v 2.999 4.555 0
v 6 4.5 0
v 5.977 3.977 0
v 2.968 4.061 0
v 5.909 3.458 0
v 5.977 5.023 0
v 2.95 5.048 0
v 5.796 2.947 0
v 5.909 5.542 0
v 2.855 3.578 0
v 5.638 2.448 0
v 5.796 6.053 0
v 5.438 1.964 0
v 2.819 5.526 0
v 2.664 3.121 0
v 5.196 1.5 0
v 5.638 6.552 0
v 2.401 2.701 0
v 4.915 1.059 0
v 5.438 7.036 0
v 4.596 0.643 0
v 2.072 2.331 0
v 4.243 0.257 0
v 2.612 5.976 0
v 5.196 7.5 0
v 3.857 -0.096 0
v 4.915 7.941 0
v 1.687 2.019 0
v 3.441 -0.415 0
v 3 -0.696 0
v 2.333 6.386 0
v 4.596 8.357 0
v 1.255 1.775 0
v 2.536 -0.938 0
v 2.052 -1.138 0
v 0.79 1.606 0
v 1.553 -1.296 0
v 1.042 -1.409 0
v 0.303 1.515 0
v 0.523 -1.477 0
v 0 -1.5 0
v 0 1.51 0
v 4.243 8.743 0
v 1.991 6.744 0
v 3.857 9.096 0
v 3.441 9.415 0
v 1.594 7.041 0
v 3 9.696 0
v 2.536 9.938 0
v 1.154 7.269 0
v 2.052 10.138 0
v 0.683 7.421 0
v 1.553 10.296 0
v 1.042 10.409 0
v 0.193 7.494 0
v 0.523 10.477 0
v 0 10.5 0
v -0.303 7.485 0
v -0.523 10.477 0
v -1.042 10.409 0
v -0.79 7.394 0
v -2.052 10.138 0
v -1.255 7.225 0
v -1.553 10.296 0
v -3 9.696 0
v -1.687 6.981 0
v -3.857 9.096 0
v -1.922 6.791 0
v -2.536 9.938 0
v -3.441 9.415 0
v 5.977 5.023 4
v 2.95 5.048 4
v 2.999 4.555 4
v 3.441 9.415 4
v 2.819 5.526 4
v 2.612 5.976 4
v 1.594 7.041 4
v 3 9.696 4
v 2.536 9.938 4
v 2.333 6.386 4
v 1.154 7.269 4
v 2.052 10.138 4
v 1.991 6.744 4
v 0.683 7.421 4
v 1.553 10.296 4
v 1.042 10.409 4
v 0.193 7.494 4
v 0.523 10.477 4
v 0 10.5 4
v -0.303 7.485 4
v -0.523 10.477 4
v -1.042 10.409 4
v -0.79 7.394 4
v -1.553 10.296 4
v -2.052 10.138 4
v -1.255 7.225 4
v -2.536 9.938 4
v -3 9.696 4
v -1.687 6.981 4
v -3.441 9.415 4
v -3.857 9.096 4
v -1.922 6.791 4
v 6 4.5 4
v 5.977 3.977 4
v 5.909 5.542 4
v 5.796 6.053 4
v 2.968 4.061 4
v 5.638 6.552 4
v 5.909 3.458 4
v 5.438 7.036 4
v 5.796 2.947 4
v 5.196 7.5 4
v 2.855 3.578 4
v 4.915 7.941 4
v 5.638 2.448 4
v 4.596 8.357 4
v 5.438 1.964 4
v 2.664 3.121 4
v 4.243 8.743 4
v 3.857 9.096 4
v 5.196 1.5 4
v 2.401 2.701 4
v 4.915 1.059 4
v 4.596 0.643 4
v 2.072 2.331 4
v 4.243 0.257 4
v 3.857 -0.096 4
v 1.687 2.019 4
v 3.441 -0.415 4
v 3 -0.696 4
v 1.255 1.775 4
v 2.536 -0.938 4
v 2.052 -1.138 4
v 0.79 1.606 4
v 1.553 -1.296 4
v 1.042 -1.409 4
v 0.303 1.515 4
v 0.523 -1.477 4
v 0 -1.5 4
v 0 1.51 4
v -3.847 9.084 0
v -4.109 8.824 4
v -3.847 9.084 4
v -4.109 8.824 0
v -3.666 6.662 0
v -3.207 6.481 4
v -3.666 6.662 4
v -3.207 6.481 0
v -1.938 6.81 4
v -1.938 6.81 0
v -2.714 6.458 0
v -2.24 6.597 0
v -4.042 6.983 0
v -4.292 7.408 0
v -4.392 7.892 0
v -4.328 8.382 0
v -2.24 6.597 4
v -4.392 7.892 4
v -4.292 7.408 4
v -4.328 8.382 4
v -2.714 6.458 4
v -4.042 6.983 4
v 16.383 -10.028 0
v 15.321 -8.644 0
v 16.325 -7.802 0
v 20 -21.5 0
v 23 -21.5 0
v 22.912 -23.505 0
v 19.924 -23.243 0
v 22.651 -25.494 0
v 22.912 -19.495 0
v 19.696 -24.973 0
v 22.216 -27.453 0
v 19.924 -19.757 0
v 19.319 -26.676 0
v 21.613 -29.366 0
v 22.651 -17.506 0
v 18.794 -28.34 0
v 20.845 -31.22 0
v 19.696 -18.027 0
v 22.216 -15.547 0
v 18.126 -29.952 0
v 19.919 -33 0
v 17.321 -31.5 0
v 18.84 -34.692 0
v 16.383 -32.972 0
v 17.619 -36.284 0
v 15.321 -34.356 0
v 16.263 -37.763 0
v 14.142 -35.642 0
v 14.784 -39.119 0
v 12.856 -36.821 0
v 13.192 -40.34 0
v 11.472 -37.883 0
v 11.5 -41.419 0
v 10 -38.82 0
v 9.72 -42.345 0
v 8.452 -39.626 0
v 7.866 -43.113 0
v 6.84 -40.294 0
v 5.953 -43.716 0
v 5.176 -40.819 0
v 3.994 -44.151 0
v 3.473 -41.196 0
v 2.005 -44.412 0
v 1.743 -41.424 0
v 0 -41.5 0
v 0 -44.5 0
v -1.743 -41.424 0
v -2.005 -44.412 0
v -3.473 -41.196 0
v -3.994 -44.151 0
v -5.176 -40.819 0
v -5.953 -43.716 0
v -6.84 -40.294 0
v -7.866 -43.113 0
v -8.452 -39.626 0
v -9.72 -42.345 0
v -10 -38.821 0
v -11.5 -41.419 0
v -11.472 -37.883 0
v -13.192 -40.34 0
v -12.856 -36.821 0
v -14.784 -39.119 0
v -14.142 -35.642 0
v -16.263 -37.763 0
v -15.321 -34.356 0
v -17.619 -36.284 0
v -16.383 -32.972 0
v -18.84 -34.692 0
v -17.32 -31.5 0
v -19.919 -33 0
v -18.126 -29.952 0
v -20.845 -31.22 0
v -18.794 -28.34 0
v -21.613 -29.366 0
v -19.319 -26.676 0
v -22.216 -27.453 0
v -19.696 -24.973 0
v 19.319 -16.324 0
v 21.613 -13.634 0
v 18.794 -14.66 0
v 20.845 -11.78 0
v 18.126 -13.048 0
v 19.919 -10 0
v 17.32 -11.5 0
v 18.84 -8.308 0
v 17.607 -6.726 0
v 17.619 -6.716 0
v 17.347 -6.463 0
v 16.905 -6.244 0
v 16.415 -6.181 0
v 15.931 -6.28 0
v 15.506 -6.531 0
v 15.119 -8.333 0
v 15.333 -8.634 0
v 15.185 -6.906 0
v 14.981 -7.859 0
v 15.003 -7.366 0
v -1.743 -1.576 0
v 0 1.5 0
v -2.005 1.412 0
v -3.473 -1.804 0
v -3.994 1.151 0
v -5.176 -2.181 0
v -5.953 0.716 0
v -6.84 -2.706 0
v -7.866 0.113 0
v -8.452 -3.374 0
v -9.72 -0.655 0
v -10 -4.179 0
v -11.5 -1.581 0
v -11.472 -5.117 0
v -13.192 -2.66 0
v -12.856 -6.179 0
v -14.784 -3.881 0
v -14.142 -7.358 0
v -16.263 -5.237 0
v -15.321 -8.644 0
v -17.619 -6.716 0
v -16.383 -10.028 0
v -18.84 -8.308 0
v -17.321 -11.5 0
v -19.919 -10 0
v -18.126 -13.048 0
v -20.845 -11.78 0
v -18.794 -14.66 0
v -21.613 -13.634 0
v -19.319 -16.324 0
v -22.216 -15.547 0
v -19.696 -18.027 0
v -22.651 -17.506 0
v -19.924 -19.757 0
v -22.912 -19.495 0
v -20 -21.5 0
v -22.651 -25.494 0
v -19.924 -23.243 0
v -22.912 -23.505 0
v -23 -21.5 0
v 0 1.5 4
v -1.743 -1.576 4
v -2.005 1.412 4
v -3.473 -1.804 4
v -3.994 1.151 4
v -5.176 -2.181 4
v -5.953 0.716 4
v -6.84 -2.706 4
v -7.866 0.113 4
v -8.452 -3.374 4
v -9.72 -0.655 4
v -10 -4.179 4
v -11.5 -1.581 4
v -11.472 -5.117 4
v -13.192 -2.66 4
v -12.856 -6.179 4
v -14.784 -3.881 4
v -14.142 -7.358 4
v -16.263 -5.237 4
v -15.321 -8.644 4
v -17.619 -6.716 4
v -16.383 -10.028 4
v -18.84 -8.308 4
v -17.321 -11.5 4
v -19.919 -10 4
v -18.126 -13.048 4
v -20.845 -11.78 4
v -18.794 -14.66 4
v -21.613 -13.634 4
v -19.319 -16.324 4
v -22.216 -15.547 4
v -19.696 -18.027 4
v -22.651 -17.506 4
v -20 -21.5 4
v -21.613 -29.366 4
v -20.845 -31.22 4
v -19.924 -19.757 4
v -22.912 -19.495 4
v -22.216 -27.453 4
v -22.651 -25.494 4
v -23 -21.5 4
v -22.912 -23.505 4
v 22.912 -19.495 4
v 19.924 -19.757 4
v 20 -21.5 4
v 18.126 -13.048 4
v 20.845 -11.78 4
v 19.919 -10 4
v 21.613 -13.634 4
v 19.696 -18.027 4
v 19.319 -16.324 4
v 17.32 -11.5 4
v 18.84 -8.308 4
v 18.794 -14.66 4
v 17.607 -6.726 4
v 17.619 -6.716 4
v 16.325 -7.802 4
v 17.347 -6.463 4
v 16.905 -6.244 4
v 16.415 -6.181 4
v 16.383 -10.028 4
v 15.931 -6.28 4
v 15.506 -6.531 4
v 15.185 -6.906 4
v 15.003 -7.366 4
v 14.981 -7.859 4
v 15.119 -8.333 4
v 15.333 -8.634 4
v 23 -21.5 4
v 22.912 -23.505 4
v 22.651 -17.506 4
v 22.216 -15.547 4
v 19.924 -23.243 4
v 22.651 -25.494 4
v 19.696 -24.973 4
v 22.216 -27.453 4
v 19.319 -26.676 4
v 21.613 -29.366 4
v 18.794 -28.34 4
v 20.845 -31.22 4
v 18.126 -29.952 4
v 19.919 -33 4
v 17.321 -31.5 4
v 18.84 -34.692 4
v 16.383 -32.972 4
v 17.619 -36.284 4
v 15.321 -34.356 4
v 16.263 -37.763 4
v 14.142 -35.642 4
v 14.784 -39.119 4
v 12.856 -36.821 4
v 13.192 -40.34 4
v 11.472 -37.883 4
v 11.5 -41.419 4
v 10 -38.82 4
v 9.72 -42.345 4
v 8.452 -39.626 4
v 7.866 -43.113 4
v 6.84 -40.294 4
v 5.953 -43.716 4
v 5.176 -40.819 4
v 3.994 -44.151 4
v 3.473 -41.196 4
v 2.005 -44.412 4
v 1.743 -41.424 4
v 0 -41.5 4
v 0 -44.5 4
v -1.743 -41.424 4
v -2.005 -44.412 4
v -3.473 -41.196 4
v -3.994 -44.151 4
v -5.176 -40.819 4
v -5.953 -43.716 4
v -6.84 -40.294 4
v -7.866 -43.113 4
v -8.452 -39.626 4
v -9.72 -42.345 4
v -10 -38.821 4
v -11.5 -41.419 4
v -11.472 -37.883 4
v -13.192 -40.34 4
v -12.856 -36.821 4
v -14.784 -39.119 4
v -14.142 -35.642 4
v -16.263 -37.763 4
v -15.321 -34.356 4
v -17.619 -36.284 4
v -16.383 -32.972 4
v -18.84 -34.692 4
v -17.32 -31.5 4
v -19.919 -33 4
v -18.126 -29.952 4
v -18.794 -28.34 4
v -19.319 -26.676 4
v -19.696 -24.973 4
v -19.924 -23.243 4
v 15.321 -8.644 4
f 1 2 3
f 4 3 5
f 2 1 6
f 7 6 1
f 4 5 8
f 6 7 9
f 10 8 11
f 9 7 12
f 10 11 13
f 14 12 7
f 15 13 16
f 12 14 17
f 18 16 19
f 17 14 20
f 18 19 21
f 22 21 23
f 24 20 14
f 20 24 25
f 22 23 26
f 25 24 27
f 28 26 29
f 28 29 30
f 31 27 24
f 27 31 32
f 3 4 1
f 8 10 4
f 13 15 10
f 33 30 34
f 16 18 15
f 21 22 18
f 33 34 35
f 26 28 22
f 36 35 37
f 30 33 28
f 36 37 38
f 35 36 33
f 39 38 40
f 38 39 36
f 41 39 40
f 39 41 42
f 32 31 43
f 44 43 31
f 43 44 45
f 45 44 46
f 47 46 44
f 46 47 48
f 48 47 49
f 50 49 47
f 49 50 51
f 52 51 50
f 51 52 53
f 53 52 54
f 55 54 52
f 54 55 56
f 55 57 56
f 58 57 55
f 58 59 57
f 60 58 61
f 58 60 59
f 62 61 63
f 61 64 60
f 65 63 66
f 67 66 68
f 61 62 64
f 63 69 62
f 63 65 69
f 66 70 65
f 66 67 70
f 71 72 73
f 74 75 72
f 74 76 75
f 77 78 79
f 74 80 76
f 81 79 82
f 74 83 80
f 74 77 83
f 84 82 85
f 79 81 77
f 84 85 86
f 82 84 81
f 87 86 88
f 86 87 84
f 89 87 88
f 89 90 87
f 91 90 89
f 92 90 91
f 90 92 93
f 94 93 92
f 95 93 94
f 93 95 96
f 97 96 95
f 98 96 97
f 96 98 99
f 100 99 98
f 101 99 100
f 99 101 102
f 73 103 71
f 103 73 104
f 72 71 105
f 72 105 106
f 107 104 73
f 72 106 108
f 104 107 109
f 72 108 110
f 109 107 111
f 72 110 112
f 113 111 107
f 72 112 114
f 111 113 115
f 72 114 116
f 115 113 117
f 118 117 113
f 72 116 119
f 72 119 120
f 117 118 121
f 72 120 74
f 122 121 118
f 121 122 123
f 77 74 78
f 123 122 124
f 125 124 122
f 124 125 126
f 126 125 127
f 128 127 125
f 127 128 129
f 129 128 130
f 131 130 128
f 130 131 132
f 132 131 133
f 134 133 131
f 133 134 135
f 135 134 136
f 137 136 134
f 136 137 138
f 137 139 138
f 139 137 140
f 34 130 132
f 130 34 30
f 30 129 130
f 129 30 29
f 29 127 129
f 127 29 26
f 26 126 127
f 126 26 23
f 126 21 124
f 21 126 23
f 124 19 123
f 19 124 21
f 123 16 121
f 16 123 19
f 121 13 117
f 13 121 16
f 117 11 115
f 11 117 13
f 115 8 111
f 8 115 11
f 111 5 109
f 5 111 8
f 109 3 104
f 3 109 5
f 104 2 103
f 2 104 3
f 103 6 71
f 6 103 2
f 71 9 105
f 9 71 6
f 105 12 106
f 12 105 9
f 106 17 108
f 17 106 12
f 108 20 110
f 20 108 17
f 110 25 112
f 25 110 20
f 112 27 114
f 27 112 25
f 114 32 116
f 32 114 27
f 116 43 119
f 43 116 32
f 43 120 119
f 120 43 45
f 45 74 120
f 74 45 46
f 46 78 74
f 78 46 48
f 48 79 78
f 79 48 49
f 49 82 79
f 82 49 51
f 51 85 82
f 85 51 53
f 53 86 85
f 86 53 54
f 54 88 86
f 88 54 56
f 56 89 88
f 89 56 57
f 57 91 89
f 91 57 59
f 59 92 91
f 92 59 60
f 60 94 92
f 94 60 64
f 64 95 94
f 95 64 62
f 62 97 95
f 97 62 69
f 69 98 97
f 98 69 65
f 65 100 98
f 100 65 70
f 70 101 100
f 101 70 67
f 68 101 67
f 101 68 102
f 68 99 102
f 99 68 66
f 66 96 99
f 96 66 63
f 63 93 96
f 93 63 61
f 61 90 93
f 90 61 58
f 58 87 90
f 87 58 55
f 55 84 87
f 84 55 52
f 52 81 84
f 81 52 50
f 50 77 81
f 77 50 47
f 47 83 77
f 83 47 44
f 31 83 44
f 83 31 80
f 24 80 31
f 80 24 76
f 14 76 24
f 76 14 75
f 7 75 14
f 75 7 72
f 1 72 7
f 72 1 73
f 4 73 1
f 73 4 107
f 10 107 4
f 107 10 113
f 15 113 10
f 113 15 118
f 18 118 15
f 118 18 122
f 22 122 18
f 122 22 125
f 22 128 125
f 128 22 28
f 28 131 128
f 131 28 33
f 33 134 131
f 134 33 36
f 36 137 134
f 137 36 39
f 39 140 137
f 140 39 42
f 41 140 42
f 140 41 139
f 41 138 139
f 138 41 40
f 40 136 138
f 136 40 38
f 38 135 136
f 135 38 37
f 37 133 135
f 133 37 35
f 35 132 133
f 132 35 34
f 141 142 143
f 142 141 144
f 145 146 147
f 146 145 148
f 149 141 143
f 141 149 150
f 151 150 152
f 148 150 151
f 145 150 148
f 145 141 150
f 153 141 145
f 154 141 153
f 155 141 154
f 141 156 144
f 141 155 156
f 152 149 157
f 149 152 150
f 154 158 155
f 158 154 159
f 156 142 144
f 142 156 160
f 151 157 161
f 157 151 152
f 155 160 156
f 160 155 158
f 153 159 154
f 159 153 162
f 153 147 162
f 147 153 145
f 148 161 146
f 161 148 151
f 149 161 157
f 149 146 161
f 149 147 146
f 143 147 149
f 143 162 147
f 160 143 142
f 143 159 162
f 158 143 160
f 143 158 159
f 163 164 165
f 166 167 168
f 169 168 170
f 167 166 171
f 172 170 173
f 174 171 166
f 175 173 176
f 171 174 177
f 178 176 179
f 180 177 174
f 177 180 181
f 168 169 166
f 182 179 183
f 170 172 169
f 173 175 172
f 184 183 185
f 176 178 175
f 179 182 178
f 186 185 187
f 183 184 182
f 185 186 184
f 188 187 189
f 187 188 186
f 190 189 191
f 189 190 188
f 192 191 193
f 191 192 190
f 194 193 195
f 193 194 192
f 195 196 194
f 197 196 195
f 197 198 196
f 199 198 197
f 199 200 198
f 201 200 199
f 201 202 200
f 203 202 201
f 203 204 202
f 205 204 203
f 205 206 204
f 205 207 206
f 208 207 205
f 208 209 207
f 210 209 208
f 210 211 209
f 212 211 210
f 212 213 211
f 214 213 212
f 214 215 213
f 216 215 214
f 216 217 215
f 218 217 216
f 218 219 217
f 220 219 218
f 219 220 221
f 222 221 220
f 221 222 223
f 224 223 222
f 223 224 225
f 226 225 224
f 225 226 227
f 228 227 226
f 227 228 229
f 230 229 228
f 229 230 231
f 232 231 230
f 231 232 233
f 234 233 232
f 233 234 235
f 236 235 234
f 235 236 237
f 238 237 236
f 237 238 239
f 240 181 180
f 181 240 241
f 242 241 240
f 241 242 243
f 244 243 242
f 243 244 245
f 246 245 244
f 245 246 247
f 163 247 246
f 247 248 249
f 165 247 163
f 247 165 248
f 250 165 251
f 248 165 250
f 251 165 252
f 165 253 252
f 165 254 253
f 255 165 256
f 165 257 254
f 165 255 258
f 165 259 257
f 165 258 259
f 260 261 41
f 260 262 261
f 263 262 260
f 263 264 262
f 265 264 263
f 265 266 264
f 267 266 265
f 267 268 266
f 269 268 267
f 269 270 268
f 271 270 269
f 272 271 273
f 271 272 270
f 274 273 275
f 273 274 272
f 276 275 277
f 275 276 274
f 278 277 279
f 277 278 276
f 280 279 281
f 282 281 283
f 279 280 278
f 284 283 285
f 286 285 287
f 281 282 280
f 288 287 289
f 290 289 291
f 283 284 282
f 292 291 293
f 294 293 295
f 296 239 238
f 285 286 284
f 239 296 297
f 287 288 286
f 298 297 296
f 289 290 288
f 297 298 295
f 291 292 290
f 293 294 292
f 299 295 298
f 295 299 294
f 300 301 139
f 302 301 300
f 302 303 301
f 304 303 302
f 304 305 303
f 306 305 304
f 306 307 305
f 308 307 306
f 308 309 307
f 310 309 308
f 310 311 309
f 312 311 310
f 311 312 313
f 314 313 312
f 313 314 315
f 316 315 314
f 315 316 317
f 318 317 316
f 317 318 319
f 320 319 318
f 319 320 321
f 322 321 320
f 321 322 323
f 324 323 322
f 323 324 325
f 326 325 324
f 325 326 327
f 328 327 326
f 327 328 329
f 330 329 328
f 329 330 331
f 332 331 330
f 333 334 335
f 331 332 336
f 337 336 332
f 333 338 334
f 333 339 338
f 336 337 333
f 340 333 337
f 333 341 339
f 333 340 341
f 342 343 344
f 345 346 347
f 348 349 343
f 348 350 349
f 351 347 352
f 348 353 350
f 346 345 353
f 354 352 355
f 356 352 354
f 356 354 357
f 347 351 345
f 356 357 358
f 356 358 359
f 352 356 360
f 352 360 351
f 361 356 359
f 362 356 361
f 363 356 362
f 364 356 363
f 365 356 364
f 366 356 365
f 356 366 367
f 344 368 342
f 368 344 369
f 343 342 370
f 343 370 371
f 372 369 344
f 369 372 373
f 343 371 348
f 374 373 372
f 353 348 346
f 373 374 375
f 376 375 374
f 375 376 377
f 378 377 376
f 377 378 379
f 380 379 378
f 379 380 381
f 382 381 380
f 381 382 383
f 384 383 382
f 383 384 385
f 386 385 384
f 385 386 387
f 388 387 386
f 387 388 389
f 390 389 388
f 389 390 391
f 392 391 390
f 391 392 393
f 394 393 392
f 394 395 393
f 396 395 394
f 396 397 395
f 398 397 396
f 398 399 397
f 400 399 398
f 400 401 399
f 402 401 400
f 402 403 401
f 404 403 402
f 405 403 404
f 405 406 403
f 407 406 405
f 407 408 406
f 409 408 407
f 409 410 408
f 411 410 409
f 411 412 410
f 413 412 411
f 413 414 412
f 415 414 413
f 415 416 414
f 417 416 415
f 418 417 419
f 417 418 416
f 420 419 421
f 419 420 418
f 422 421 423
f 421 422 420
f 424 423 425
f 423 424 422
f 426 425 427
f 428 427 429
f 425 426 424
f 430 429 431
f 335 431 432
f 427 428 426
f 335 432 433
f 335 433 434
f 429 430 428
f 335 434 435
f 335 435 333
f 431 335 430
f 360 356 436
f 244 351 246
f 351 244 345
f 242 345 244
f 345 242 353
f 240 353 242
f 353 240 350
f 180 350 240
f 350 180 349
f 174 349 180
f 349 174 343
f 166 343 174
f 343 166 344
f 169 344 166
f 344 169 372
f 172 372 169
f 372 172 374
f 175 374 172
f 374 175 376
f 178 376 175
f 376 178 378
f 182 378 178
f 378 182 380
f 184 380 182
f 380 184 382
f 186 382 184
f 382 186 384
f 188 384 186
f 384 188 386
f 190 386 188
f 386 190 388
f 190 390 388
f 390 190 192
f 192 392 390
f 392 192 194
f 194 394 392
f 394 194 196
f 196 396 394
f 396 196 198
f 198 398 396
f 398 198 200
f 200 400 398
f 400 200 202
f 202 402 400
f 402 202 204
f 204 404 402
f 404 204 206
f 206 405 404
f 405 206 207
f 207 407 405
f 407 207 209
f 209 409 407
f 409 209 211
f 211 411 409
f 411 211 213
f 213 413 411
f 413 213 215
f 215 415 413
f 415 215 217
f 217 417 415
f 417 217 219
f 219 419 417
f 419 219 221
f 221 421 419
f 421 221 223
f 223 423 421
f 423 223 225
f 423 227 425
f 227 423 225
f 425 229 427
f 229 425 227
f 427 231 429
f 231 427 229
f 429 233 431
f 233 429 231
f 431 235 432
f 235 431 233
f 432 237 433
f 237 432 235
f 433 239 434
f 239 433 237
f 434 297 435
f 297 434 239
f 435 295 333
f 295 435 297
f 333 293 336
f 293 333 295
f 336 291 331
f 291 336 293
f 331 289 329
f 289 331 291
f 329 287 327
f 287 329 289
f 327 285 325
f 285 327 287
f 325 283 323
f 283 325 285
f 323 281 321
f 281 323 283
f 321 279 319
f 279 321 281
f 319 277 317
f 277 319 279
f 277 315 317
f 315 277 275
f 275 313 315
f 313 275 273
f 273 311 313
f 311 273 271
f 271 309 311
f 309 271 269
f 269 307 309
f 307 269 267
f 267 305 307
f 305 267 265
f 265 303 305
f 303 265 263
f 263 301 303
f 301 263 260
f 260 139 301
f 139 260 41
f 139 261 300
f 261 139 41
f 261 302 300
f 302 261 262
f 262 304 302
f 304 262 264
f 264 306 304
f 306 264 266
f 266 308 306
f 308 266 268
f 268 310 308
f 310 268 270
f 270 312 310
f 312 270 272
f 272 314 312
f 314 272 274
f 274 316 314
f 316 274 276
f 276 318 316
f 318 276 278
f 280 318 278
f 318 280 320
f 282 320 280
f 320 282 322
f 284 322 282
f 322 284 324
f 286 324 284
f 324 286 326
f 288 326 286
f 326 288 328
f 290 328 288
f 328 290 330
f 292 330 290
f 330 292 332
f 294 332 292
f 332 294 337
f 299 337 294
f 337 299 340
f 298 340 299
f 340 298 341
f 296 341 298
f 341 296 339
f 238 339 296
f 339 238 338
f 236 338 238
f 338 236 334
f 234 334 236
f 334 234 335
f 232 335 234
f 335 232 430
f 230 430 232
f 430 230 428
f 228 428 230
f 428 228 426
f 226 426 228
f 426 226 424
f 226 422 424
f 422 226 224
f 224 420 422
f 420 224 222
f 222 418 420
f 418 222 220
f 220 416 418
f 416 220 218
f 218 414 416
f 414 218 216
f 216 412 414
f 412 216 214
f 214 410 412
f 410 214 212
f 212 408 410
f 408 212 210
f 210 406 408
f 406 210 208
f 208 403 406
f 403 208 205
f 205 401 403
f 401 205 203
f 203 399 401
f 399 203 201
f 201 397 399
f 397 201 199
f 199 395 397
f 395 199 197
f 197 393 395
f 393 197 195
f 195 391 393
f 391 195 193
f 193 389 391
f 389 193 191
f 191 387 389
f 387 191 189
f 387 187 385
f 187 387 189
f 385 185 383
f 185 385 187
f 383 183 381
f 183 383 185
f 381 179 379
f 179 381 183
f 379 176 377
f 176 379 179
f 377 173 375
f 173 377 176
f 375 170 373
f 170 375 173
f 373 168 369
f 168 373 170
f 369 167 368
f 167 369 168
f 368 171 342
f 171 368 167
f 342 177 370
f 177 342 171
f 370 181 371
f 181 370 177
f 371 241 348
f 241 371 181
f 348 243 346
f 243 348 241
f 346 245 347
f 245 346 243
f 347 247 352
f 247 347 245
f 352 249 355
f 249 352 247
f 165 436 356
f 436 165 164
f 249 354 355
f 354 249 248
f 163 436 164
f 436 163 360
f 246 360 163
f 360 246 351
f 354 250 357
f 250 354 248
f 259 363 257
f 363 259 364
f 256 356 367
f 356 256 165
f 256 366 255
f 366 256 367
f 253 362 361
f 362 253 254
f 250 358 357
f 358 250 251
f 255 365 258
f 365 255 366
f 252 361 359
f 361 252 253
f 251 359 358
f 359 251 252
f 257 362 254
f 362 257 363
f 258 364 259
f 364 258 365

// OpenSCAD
Guide_Tickness = 4; // [1:10]
Guide_Width = 3; // [2:6]

// Radius of the thing you fix the guide to
Small_Radius = 3; // [1:10]

// How much room do you give your plant?
Large_Radius = 20; // [10:50]


module arc(radius, thick, angle){
	intersection(){
		union(){
			rights = floor(angle/90);
			remain = angle-rights*90;
			if(angle > 90){
				for(i = [0:rights-1]){
					rotate(i*90-(rights-1)*90/2){
						polygon([[0, 0], [radius+thick, (radius+thick)*tan(90/2)], [radius+thick, -(radius+thick)*tan(90/2)]]);
					}
				}
				rotate(-(rights)*90/2)
					polygon([[0, 0], [radius+thick, 0], [radius+thick, -(radius+thick)*tan(remain/2)]]);
				rotate((rights)*90/2)
					polygon([[0, 0], [radius+thick, (radius+thick)*tan(remain/2)], [radius+thick, 0]]);
			}else{
				polygon([[0, 0], [radius+thick, (radius+thick)*tan(angle/2)], [radius+thick, -(radius+thick)*tan(angle/2)]]);
			}
		}
		difference(){
			circle(radius+thick);
			circle(radius);
		}
	}
}


// Set number of faces
$fs=0.5;
$fa=5;

// Draw Small Arc
translate([0,Small_Radius+Guide_Width/2,0])
rotate([0,0,20])   
linear_extrude(height=Guide_Tickness)
    arc(Small_Radius, Guide_Width, 220);
;

// Draw Small Arc Fillet
translate([0,Small_Radius+Guide_Width/2,0])
rotate([0,0,220])    
translate([0,-Small_Radius-Guide_Width/2,0]) 
linear_extrude(height=Guide_Tickness)
        arc(0, Guide_Width/2, 180);
;

// Draw Large Arc
translate([0,-Large_Radius-Guide_Width/2,0])    
rotate([0,0,245])
linear_extrude(height=Guide_Tickness)
    arc(Large_Radius, Guide_Width, 310);
;

// Draw Large Arc Fillet
translate([0,-Large_Radius-Guide_Width/2,0])    
rotate([0,0,130])    
translate([0,-Large_Radius-Guide_Width/2,0]) 
linear_extrude(height=Guide_Tickness)
    arc(0, Guide_Width/2, 180);
;
